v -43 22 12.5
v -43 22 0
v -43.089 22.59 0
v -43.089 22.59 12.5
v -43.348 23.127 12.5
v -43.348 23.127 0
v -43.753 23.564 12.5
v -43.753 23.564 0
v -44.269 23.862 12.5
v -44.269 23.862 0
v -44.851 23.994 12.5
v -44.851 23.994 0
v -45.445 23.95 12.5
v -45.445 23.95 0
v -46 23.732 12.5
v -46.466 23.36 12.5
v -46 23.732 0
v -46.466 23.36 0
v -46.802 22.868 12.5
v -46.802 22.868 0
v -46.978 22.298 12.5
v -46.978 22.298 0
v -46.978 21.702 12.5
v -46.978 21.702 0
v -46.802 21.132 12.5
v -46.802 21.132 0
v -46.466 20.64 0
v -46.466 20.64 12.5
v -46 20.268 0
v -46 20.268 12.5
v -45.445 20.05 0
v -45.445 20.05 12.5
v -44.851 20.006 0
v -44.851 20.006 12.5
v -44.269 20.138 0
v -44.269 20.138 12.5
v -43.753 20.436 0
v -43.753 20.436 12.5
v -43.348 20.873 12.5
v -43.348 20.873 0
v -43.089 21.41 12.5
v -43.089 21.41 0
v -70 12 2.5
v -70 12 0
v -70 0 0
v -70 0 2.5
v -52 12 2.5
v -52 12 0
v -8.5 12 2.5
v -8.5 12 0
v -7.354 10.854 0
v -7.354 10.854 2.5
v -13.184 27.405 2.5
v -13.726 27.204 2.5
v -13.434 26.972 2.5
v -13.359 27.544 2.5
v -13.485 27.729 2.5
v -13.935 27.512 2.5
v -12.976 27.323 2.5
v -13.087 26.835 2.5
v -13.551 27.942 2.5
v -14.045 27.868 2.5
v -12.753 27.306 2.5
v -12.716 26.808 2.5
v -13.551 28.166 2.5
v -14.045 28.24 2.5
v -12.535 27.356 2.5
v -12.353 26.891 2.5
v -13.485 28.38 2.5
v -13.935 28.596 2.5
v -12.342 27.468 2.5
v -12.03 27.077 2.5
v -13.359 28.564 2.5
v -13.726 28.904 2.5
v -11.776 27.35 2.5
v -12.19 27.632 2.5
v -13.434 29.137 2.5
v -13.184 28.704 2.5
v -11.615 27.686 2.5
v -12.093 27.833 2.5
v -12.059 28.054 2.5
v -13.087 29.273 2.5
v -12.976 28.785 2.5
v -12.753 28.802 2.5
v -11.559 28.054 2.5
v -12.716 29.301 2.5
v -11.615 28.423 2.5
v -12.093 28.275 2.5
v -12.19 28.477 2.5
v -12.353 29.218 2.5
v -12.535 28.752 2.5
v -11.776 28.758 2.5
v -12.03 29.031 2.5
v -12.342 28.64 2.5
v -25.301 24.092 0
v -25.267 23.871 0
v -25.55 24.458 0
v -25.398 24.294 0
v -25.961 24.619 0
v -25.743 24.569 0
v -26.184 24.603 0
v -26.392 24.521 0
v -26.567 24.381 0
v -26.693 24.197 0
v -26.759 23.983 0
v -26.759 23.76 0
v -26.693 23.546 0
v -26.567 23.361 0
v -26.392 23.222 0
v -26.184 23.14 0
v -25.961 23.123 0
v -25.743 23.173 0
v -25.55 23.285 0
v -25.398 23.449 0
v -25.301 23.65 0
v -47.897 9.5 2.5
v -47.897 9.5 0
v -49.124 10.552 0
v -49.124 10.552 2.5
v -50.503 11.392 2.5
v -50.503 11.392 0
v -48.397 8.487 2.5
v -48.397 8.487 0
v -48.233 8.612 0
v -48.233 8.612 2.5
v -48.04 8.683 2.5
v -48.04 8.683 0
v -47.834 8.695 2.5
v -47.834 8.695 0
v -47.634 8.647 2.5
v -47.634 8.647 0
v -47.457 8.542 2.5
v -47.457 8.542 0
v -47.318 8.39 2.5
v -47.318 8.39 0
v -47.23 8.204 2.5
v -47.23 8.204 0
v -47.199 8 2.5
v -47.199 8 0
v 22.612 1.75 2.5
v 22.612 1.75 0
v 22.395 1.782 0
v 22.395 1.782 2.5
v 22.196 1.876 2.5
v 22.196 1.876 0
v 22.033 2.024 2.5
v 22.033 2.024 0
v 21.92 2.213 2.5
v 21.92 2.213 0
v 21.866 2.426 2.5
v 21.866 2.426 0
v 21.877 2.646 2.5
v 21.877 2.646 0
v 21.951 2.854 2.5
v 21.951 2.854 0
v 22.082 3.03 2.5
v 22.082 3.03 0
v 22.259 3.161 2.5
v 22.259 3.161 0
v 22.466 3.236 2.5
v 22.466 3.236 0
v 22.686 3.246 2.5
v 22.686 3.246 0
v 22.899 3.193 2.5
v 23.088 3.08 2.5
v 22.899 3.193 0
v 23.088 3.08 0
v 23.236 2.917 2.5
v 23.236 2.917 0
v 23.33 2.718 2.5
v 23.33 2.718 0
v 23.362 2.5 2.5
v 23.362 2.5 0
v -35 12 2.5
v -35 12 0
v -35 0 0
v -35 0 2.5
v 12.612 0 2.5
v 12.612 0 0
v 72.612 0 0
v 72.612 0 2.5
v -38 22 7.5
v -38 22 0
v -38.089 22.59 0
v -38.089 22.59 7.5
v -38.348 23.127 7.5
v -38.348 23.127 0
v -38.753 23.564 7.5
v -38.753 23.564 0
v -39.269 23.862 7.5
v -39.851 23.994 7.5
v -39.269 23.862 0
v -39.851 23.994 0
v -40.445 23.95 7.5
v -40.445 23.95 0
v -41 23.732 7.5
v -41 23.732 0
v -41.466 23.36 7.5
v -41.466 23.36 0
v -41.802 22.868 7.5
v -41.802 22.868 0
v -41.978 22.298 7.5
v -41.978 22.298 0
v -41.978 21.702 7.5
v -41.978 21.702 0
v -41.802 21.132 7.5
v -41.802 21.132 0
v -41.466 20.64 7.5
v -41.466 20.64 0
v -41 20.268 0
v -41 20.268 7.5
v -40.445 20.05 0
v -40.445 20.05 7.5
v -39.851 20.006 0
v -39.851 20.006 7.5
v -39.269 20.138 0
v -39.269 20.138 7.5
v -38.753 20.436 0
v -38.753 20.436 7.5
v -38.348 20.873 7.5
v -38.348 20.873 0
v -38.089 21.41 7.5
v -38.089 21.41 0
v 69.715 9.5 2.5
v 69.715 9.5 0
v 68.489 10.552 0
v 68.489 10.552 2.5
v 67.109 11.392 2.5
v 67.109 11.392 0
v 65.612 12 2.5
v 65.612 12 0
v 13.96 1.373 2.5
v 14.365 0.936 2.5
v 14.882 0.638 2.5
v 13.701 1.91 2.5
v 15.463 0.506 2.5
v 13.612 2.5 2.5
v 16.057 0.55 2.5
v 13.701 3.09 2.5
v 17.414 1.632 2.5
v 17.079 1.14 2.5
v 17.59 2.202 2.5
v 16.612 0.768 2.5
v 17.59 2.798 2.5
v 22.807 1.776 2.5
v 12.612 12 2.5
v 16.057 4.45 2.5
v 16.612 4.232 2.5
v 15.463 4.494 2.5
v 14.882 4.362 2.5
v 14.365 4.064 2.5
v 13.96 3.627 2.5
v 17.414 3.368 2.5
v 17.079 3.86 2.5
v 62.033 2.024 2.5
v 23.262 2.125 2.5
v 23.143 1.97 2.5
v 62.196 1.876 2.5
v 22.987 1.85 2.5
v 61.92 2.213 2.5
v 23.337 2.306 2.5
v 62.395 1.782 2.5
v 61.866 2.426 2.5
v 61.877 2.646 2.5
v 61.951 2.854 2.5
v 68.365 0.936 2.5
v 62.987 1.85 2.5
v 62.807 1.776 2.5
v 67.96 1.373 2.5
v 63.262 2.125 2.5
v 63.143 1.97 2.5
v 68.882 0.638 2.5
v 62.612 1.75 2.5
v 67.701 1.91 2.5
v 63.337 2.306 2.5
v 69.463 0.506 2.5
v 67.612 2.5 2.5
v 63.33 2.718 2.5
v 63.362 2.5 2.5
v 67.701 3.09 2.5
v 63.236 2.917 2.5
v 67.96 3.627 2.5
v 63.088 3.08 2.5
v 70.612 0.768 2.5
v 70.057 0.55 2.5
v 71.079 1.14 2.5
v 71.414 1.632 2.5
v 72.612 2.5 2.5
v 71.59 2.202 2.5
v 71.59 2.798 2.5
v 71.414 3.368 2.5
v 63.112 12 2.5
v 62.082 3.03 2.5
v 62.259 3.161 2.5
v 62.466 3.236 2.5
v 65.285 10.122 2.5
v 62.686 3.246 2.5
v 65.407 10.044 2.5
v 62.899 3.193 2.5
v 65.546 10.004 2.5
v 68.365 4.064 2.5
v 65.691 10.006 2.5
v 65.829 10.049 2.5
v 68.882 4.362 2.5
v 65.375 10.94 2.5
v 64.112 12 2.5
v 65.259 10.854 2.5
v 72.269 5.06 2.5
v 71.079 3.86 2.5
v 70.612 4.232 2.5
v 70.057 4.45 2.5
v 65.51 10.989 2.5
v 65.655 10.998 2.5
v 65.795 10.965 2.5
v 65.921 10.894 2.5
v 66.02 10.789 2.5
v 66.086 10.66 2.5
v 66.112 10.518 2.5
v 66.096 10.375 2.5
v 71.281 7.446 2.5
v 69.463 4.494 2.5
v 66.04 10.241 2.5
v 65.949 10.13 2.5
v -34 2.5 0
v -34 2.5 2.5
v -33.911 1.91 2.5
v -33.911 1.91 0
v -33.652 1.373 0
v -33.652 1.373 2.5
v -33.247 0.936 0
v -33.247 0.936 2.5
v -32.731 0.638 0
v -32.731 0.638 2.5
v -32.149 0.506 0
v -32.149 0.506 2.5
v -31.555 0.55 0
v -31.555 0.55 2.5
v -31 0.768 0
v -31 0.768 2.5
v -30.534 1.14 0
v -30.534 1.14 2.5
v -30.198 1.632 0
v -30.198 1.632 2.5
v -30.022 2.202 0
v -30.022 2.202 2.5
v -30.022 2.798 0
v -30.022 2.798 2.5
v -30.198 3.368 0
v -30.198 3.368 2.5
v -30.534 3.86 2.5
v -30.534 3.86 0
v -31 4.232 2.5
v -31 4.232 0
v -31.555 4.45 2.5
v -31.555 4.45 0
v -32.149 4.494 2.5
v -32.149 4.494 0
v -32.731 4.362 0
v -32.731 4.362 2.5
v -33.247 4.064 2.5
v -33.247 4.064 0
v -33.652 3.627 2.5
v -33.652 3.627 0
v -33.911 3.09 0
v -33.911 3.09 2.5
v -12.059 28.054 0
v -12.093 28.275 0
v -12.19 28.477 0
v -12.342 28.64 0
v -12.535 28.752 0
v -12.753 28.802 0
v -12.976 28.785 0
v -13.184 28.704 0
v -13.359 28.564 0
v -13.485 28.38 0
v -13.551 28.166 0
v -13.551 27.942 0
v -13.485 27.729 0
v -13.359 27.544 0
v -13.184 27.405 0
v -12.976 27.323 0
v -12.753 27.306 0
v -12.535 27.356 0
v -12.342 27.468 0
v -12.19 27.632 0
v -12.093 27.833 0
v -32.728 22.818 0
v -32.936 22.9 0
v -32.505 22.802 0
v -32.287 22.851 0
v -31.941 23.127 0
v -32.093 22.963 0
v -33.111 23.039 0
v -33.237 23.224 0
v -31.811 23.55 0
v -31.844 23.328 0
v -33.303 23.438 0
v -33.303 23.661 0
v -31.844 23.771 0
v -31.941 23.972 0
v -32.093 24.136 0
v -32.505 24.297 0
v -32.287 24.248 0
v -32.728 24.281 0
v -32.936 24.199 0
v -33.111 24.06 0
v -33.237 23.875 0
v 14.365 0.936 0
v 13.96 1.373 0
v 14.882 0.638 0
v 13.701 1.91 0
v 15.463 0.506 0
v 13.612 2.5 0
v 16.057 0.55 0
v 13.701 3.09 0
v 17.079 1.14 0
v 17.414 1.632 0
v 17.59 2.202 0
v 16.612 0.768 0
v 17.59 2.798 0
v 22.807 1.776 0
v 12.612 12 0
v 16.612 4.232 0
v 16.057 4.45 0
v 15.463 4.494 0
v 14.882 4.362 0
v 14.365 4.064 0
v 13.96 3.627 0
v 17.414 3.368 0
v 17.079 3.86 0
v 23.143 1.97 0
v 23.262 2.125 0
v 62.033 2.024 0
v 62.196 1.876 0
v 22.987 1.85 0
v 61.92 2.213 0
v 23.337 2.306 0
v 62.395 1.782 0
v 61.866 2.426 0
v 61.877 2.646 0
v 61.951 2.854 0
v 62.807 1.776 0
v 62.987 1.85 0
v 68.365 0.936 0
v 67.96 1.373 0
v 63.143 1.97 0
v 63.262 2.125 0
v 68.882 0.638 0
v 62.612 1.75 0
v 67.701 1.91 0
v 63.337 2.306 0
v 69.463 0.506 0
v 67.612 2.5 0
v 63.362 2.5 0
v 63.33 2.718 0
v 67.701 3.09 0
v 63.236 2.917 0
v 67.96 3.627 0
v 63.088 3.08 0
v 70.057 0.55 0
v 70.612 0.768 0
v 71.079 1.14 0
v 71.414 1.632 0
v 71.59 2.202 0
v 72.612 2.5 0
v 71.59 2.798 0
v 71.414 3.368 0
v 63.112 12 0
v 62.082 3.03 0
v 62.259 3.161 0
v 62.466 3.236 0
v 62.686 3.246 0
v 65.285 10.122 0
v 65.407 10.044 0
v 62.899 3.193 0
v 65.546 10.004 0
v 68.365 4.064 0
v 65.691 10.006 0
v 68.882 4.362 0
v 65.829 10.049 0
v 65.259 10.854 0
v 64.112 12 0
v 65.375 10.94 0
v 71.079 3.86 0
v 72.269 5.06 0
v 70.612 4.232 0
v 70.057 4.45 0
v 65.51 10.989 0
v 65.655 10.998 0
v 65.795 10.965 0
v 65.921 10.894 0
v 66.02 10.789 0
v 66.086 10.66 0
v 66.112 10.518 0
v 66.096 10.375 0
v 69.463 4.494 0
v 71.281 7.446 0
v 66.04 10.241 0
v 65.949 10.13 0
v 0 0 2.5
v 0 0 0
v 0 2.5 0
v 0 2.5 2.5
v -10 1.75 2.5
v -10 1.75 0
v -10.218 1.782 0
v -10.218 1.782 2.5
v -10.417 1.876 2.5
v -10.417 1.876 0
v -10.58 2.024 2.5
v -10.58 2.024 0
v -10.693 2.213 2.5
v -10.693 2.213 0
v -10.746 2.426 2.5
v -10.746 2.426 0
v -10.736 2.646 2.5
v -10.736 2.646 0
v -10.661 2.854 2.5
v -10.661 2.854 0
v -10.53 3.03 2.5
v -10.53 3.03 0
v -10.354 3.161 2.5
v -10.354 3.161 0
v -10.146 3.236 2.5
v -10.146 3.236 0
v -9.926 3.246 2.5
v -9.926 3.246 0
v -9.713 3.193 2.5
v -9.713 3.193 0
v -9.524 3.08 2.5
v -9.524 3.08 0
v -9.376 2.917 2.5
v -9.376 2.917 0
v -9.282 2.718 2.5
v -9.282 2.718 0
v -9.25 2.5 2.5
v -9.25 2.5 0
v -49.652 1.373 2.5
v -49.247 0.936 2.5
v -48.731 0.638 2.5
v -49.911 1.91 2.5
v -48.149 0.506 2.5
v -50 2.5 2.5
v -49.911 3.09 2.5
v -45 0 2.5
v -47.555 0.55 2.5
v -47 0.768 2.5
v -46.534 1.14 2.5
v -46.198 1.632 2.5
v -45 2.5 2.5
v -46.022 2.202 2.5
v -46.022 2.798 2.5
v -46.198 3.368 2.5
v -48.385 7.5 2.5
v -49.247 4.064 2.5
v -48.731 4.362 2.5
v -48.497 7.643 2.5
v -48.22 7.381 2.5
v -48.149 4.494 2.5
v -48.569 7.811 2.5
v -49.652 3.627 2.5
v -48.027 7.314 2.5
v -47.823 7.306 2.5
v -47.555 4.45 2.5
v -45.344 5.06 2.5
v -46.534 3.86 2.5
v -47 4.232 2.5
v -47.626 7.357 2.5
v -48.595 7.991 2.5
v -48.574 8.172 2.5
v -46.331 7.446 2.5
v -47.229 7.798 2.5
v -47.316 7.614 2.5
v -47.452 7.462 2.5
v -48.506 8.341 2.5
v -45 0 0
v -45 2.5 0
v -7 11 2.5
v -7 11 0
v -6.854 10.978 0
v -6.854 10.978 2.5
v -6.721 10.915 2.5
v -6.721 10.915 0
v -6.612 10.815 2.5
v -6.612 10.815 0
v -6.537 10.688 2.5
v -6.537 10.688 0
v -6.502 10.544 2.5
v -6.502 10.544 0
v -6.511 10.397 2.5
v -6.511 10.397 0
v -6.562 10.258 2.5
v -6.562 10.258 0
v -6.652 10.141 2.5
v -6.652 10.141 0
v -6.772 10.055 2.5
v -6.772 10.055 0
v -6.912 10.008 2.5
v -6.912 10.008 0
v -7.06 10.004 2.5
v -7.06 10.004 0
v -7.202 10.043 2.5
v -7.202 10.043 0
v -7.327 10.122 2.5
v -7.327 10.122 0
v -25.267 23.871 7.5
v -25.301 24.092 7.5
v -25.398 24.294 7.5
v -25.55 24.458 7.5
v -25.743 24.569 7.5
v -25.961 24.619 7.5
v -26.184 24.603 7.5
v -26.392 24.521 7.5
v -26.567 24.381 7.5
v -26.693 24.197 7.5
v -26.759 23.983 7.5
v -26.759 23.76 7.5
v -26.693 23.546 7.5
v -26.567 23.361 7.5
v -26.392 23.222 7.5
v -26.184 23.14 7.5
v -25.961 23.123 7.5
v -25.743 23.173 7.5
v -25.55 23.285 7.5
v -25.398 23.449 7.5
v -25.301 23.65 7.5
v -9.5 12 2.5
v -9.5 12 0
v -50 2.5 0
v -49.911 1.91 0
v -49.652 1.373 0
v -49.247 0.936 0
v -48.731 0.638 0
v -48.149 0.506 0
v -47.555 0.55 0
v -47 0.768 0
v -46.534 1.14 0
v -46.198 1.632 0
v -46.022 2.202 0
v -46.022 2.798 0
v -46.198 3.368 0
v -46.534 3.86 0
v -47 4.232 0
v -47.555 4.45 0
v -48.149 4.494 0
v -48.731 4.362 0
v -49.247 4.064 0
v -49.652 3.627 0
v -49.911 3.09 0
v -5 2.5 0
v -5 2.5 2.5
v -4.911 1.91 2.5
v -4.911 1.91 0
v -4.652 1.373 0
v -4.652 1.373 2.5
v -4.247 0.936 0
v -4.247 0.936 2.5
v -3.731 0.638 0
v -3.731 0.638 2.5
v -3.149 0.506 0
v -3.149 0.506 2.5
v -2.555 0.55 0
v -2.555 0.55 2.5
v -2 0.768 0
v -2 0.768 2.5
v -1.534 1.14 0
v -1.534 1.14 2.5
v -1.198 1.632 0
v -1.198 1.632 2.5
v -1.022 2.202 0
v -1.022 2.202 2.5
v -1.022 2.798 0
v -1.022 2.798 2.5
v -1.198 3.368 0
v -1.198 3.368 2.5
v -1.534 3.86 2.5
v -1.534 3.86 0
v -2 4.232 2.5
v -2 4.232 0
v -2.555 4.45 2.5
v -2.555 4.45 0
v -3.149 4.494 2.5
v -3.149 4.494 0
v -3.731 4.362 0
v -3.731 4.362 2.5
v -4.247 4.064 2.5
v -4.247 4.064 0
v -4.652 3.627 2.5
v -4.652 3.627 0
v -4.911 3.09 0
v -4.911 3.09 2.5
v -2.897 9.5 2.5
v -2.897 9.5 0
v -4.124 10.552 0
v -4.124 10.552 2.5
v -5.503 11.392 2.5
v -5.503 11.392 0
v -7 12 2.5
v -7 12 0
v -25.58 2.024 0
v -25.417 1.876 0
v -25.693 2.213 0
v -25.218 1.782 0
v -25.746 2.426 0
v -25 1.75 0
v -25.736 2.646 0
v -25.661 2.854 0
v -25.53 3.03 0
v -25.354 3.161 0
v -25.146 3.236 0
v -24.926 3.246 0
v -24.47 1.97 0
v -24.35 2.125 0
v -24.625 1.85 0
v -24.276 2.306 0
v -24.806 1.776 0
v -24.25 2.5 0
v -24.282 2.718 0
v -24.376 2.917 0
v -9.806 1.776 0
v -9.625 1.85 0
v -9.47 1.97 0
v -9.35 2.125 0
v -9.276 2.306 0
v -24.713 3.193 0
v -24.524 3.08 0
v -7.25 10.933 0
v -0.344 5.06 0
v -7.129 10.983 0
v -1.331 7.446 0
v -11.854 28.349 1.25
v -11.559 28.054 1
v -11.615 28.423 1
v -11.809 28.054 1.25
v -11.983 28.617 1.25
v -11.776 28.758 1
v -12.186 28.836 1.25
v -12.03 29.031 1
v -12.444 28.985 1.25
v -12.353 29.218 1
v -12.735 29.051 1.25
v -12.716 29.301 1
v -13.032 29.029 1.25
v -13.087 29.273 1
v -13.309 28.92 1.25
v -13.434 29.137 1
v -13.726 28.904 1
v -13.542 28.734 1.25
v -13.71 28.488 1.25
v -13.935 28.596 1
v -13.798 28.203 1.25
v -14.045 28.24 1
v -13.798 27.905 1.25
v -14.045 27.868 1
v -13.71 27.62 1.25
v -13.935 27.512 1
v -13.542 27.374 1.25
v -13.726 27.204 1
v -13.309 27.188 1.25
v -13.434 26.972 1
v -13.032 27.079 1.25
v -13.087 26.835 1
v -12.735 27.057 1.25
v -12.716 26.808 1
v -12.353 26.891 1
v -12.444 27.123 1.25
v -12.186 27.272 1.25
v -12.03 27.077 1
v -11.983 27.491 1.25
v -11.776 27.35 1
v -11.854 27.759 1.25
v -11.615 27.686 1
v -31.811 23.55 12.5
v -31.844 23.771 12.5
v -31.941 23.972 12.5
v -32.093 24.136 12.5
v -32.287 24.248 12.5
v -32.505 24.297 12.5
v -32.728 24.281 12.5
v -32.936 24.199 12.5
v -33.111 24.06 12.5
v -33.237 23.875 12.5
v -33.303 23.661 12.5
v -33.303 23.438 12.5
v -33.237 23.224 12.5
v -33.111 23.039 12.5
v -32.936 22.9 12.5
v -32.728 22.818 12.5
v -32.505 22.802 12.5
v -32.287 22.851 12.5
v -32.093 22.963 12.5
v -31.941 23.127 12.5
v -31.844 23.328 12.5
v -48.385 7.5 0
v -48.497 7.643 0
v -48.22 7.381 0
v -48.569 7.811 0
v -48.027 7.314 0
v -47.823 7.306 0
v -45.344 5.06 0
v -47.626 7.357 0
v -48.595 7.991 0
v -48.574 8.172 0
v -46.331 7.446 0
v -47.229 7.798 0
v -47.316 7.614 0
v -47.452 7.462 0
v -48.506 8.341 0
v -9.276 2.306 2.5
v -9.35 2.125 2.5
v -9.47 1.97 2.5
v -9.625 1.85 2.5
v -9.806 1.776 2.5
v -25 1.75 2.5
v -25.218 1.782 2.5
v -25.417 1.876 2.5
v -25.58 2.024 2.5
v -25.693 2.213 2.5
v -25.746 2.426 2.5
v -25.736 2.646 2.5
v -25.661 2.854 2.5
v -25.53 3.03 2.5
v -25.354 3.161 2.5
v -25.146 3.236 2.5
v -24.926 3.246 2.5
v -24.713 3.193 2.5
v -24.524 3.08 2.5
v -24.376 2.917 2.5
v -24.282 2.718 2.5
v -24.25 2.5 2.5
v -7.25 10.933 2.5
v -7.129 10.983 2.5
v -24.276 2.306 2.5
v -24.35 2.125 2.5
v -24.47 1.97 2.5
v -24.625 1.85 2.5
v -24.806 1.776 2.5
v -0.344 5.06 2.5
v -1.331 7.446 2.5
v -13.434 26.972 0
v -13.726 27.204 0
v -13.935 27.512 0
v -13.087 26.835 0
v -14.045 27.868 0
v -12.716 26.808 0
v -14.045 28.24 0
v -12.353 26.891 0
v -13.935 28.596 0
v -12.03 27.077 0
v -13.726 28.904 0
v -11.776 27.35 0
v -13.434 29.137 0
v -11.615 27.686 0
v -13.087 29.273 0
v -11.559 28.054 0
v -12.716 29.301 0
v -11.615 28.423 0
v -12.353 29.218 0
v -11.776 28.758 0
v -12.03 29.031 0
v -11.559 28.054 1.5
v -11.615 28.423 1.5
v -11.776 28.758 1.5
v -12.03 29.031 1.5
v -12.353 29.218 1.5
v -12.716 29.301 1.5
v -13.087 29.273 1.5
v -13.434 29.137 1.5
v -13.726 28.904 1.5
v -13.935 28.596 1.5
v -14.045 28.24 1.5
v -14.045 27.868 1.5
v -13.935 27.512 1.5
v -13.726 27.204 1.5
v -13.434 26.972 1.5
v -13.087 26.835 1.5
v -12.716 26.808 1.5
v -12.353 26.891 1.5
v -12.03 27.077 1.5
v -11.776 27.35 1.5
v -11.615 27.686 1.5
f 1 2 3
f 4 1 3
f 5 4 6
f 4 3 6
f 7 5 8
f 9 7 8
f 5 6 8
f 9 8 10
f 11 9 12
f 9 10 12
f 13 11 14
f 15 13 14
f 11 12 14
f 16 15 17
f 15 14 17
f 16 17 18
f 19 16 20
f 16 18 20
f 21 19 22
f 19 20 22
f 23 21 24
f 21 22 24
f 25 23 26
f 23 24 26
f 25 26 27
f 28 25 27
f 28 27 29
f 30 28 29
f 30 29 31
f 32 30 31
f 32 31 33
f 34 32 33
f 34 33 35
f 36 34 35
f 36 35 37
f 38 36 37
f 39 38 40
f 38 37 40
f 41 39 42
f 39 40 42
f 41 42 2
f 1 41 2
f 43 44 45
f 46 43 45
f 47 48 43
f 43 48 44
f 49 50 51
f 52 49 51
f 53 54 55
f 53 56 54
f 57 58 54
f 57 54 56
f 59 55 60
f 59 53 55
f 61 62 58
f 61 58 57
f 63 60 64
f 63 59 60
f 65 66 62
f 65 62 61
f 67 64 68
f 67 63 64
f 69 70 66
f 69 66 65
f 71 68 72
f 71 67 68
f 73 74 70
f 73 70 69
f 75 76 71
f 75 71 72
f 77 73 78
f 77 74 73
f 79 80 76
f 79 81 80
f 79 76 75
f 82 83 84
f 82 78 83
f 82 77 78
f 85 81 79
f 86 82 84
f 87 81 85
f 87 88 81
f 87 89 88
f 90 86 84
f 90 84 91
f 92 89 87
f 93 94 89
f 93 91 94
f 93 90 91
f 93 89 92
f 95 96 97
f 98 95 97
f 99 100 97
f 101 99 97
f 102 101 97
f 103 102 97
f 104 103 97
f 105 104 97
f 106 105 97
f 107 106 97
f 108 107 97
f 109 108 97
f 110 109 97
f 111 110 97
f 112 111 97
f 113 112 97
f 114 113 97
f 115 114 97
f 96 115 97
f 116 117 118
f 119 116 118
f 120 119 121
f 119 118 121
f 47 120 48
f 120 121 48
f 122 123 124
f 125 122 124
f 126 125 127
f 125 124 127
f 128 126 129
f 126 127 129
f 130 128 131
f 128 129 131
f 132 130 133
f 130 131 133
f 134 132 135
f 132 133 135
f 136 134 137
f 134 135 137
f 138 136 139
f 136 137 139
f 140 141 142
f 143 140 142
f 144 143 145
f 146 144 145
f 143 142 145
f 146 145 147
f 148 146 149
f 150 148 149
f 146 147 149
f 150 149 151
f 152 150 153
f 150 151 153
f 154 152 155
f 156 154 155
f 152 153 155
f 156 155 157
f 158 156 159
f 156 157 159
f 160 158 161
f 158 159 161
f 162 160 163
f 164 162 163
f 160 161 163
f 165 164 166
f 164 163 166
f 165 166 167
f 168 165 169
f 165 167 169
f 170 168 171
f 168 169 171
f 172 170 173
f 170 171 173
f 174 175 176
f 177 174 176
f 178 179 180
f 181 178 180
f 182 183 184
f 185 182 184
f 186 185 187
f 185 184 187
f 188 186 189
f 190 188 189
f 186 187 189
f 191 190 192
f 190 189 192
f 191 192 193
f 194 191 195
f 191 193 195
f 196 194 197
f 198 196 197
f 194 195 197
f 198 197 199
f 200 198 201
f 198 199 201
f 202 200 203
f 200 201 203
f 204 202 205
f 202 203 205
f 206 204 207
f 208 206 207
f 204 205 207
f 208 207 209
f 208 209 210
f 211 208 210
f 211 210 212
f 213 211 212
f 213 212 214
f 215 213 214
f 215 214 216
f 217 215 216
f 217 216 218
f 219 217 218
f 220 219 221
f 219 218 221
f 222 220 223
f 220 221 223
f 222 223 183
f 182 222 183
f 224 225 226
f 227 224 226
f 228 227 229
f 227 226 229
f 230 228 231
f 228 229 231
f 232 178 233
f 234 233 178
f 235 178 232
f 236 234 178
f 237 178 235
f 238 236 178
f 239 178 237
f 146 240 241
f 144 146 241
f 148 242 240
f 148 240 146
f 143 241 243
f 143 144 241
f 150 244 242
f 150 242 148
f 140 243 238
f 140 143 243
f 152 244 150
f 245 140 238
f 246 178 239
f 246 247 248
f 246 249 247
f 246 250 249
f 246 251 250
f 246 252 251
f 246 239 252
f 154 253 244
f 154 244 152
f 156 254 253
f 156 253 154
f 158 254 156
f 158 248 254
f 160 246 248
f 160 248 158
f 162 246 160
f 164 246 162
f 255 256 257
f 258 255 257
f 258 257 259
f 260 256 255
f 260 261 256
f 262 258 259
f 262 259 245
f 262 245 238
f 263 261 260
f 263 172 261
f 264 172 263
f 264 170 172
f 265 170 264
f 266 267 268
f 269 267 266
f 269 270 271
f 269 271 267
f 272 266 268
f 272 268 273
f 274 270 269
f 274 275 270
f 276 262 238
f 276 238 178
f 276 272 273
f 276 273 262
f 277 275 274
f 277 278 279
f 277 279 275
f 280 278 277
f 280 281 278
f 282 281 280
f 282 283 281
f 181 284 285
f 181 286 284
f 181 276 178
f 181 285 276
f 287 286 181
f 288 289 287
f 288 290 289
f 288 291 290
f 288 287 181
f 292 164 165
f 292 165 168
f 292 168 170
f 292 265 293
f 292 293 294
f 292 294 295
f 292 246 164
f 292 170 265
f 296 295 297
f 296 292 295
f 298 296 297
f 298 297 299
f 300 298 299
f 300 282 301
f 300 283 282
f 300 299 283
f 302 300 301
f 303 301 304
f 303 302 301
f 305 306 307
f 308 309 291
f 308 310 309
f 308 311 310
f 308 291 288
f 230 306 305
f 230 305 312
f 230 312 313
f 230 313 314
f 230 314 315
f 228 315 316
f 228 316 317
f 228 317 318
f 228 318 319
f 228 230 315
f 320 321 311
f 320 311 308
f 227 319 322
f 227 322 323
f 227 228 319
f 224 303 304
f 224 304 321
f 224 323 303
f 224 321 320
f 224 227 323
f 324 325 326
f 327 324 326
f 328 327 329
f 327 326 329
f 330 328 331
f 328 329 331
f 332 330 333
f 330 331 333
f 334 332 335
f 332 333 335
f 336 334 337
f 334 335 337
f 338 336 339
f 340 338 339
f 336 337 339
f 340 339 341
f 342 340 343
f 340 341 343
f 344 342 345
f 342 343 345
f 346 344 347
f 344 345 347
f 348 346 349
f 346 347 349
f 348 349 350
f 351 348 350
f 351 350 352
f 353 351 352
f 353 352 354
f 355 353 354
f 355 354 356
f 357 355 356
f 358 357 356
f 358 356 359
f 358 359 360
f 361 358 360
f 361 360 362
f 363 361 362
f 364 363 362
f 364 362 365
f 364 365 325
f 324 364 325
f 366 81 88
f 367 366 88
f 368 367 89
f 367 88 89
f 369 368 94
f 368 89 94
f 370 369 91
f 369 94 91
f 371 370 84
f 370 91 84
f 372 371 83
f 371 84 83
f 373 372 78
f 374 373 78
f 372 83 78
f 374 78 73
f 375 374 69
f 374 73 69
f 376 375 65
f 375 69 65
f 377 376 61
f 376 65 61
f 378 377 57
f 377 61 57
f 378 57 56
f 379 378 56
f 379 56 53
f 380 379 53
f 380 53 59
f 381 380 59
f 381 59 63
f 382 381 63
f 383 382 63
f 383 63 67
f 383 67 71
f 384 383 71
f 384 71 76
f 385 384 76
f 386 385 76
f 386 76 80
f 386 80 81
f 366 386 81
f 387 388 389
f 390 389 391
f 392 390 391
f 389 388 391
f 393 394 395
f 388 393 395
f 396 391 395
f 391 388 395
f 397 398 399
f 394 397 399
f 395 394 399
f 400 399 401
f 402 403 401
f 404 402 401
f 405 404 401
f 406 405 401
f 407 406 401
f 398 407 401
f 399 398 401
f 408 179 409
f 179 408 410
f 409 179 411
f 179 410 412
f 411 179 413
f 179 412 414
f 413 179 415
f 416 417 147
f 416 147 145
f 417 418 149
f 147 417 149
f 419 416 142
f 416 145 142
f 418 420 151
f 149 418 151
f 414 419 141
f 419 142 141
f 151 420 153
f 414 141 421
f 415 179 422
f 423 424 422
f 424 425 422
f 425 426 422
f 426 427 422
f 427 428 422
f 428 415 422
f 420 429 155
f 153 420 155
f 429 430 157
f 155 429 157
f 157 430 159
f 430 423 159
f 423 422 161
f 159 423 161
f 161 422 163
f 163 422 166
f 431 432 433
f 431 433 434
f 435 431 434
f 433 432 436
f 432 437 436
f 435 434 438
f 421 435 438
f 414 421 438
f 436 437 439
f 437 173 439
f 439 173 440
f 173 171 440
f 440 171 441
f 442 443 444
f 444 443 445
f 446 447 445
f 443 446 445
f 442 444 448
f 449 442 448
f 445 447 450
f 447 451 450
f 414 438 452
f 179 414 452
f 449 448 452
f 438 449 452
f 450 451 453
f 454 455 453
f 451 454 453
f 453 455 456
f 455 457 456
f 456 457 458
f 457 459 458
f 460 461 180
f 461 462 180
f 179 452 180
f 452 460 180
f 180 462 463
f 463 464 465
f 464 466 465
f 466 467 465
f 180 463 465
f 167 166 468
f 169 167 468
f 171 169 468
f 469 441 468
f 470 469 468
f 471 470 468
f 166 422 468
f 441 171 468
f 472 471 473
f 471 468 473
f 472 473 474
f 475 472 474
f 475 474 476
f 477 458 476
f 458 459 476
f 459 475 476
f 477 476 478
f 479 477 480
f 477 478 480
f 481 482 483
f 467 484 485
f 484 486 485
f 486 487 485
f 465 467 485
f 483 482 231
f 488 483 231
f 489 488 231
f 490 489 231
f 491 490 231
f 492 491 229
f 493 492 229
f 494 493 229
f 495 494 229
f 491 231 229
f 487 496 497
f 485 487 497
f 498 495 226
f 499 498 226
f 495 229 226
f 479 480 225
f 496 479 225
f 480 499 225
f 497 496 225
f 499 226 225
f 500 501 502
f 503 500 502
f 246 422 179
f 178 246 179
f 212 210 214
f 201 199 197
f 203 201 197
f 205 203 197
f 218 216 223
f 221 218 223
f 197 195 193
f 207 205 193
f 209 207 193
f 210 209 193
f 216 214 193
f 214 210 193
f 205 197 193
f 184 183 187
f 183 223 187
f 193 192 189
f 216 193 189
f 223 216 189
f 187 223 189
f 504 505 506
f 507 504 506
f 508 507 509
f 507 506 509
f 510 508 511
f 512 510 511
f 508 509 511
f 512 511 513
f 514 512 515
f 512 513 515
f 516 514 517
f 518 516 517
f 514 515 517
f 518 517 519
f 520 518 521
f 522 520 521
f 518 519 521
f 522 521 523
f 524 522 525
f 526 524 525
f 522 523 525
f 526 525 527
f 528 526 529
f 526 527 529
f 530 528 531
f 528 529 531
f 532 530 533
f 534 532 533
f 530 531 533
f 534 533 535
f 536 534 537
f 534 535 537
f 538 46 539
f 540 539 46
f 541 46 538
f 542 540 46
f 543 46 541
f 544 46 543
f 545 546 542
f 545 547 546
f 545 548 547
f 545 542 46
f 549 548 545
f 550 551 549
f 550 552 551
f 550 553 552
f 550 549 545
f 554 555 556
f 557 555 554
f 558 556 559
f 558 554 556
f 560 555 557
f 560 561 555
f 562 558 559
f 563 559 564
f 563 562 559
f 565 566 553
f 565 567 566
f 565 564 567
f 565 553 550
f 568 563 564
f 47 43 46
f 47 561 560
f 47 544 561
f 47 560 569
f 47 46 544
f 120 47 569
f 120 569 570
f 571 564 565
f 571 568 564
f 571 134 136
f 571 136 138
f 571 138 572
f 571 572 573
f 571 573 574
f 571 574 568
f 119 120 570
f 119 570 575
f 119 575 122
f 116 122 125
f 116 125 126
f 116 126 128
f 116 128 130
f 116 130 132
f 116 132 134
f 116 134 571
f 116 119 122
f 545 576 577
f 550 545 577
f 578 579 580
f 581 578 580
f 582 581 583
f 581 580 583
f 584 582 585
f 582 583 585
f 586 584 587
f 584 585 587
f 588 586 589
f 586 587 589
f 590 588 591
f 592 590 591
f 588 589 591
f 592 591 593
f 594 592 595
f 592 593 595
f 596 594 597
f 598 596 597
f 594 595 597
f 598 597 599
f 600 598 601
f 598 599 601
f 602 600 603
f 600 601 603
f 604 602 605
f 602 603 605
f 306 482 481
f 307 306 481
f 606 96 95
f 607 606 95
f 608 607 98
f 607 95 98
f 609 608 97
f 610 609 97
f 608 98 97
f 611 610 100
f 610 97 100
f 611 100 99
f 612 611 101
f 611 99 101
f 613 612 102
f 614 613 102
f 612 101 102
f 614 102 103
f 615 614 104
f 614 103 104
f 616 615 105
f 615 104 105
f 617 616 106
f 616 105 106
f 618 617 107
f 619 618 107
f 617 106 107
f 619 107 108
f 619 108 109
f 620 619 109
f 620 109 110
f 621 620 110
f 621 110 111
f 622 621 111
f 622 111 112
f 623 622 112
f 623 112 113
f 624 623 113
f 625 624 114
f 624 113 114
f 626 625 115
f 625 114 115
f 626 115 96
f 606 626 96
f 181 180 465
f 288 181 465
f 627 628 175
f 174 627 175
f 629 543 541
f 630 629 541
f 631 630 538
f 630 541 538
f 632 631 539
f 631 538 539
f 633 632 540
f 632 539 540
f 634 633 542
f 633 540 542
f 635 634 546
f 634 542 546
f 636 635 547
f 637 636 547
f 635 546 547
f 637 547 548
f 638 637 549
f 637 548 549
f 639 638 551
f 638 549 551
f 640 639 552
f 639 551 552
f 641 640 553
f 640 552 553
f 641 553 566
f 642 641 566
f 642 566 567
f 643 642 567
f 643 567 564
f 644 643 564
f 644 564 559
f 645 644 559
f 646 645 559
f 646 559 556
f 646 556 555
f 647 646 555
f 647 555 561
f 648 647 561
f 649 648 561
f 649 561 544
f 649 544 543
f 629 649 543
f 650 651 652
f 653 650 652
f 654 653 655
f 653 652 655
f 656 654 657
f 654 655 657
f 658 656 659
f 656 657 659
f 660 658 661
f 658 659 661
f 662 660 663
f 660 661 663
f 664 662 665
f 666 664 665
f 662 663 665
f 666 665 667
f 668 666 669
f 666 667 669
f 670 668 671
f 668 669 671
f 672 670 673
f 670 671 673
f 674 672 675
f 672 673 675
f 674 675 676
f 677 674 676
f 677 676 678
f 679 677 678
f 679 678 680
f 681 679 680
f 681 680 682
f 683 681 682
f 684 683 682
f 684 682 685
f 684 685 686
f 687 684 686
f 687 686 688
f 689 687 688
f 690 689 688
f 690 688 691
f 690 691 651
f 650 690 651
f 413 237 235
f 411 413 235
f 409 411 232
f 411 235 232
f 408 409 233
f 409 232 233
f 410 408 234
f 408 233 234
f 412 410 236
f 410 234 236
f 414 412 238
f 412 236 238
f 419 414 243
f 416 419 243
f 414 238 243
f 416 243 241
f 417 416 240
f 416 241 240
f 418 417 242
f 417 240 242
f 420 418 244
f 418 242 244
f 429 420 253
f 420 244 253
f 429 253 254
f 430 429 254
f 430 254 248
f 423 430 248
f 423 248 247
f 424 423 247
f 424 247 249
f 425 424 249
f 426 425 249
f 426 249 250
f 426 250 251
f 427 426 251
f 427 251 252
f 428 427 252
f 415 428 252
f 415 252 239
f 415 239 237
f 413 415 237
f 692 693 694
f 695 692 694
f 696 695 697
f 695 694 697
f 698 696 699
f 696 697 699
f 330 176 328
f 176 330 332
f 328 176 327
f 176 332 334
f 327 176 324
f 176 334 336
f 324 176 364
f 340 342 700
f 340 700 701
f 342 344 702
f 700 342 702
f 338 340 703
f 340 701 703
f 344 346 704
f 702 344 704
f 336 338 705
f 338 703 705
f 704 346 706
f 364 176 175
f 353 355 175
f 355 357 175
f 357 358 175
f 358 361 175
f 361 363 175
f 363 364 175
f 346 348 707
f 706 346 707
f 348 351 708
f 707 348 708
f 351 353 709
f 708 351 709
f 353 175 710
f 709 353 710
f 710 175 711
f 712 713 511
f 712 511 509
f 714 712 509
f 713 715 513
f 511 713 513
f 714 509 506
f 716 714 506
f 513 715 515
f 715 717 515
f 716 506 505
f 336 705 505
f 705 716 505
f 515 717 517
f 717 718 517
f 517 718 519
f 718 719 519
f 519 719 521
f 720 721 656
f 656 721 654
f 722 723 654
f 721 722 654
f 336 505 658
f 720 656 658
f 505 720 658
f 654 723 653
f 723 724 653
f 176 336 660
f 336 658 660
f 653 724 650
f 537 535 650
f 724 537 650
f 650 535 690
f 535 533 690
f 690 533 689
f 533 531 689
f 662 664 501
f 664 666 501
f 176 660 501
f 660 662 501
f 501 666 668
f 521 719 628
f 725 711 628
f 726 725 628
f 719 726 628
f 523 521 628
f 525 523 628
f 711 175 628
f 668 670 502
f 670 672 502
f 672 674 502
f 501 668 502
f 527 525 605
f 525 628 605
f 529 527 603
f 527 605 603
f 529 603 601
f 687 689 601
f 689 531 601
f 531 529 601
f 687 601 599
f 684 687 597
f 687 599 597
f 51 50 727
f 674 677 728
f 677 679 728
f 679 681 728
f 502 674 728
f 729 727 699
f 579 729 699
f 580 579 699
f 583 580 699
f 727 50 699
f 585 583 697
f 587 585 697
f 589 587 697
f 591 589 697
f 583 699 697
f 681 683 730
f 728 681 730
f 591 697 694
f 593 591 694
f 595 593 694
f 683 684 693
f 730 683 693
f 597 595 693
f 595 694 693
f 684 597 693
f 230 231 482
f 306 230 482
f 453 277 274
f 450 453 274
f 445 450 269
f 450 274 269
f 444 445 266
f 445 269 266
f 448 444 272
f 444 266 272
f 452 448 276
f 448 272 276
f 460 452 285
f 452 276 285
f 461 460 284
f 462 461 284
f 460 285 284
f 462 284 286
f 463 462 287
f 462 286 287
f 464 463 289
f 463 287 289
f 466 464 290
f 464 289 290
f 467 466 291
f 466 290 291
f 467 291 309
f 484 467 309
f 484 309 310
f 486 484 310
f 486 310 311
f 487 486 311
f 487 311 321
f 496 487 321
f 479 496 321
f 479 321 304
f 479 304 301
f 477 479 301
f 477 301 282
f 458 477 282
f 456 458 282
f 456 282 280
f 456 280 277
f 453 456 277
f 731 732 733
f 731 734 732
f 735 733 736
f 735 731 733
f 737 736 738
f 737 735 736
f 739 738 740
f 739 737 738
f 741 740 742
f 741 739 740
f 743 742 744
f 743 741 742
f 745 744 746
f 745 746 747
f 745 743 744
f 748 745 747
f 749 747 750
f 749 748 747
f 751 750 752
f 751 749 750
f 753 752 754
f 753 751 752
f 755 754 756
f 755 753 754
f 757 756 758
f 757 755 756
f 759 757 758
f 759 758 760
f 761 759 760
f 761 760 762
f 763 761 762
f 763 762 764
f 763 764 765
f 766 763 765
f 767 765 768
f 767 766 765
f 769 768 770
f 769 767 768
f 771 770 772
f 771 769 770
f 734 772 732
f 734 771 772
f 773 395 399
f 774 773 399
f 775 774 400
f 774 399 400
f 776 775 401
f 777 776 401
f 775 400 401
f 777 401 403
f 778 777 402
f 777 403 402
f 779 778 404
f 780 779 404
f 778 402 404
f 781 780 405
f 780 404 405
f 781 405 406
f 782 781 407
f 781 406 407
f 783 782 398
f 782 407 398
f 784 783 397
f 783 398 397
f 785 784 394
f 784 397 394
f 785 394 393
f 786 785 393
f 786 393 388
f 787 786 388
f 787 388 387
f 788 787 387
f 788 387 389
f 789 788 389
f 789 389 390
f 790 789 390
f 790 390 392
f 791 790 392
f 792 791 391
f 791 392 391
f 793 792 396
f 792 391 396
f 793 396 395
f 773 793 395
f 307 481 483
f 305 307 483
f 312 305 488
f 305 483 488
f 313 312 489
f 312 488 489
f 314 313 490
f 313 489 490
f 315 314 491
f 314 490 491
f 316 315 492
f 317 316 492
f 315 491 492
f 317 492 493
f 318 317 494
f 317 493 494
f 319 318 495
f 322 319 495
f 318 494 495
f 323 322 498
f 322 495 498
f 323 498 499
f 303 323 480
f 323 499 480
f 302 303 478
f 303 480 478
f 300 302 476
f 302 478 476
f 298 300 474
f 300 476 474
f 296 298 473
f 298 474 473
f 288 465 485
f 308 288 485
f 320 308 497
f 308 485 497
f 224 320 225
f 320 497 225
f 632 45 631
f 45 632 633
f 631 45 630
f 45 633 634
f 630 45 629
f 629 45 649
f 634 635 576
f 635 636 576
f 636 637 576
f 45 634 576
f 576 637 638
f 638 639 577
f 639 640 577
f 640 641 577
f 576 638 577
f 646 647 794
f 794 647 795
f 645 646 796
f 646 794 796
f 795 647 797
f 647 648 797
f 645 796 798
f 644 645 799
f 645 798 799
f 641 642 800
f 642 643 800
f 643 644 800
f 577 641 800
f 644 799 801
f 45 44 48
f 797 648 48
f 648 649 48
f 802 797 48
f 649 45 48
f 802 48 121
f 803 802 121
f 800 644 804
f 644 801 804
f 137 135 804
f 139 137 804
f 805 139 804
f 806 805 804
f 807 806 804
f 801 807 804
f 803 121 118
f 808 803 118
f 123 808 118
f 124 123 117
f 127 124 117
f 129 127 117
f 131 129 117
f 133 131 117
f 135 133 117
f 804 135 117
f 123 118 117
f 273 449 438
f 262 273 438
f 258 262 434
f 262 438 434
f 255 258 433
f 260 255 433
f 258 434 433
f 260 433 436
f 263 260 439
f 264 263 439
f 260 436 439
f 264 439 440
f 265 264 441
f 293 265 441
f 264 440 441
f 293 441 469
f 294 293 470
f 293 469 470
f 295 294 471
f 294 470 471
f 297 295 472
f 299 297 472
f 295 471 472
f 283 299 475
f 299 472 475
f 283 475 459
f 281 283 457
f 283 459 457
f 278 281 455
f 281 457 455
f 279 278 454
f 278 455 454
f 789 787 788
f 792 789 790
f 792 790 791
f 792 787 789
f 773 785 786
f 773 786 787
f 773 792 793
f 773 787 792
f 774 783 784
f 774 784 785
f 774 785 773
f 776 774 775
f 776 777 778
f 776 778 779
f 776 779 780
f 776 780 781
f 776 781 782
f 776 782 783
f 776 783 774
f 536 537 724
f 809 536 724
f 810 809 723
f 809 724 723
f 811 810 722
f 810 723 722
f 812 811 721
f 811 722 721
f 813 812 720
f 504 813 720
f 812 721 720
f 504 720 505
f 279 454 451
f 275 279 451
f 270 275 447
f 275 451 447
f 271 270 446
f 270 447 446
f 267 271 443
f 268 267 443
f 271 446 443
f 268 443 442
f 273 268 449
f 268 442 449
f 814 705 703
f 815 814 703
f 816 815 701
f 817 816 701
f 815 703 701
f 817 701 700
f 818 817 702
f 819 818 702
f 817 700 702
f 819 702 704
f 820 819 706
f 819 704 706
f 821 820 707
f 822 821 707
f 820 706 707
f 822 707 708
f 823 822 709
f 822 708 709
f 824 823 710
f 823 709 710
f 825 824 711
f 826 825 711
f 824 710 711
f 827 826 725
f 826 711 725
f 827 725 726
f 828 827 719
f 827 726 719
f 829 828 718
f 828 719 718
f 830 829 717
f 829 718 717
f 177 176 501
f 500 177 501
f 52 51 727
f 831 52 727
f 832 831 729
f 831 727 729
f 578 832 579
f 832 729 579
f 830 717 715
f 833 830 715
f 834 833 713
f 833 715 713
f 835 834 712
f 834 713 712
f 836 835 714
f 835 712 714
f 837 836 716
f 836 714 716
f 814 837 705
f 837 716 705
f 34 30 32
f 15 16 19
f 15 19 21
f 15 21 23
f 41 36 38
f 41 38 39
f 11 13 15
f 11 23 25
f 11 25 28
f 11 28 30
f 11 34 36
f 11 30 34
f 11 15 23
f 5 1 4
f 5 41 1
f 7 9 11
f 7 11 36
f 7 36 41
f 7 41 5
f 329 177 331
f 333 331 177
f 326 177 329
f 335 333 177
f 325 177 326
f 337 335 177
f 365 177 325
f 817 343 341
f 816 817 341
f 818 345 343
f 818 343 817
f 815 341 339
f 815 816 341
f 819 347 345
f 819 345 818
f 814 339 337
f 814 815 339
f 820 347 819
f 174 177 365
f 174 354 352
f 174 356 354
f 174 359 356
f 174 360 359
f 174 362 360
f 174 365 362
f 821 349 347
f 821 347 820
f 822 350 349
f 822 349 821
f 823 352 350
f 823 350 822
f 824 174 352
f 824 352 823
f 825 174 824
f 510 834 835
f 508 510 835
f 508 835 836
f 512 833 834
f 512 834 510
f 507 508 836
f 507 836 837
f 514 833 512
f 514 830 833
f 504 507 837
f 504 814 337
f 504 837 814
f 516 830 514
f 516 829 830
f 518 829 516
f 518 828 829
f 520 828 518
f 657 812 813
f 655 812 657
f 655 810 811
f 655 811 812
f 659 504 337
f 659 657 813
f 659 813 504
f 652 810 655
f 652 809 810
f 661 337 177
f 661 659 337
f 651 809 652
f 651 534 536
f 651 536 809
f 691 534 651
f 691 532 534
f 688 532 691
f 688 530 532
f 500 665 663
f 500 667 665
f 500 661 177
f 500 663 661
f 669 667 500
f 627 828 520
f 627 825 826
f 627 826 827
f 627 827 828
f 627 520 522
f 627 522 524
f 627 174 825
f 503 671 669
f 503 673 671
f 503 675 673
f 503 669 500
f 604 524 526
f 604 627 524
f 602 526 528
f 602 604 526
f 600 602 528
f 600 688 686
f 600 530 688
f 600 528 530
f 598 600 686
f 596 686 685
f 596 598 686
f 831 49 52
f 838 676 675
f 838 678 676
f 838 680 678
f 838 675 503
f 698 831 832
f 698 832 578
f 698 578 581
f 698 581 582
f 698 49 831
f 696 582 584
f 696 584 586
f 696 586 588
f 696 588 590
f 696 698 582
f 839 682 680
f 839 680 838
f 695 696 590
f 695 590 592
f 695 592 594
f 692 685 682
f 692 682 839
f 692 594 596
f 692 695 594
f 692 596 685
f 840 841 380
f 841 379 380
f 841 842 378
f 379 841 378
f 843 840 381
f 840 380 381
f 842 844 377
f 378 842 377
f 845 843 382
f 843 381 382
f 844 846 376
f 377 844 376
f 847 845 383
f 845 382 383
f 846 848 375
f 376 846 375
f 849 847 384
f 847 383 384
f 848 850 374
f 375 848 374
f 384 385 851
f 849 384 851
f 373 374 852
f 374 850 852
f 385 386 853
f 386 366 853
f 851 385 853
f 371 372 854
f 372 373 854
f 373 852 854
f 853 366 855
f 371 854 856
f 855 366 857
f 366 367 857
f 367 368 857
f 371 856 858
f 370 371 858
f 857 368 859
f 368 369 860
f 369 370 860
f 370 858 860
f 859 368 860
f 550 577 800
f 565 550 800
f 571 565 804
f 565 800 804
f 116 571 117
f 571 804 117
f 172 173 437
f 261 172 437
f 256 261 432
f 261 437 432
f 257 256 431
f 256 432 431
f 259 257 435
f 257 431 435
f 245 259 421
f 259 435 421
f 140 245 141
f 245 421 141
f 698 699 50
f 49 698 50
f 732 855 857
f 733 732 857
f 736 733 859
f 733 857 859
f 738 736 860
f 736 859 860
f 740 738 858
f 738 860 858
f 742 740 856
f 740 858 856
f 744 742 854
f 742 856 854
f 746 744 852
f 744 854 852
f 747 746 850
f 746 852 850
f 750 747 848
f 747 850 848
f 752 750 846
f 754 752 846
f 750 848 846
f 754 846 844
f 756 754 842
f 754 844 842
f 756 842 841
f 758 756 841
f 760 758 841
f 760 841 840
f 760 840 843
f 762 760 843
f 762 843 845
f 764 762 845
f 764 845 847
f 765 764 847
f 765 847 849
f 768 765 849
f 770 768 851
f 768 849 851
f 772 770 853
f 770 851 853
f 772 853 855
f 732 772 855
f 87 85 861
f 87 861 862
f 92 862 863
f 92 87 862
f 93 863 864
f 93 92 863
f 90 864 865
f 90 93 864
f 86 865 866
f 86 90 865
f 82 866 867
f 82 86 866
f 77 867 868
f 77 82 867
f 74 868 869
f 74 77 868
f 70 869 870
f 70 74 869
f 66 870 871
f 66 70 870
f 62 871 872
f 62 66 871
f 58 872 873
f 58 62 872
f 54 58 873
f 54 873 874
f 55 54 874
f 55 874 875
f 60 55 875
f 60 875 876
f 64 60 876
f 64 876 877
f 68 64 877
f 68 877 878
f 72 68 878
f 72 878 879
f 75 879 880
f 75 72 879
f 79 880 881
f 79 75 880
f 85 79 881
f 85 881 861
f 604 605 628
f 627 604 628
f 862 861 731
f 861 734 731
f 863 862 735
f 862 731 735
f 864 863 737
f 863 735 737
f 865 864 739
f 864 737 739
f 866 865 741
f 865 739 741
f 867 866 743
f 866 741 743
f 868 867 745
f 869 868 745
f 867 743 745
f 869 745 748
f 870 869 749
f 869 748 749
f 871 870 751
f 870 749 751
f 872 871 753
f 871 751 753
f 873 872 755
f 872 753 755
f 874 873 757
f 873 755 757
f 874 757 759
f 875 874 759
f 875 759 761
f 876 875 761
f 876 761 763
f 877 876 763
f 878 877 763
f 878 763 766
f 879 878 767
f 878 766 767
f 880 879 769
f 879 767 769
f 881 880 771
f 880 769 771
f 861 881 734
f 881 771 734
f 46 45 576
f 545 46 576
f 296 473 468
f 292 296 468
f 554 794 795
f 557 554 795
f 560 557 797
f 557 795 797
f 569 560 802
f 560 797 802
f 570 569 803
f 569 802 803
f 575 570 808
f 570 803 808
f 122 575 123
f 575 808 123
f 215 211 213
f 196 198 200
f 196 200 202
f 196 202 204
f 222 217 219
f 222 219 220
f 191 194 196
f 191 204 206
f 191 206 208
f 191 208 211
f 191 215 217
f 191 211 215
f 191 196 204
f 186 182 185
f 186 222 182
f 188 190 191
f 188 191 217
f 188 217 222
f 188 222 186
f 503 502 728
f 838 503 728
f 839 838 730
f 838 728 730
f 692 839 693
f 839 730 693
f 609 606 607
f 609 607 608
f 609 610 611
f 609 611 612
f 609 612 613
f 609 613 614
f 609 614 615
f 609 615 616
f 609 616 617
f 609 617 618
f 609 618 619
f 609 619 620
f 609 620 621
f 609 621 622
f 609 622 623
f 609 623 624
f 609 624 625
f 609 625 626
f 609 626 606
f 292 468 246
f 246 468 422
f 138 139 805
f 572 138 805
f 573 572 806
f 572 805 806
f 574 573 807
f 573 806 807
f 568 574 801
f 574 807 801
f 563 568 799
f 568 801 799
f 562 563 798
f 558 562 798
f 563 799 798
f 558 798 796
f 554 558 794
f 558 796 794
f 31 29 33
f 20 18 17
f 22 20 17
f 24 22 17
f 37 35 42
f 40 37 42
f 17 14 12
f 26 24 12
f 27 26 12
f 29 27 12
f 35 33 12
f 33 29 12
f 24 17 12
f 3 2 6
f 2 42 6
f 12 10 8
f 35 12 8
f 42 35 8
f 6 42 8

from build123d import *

# Parameters (mm, degrees)
F0_R       = 2
F1_DEPTH   = 2.5
F2_D       = 4
F2_DEPTH   = 16
F2_TIP     = 1.2017212381
F2_2_D     = 4
F2_2_DEPTH = 16
F2_2_TIP   = 1.2017212381
F2_3_D     = 4
F2_3_DEPTH = 16
F2_3_TIP   = 1.2017212381
F3_DEPTH   = 12.5
F4_R       = 0.75
F5_DEPTH   = 12.5
F6_DEPTH   = 7.5
F7_DEPTH   = 7.5
F8_R       = 1.25
F8_R_2     = 0.75
F9_DEPTH   = 1.25
F10_SIZE   = 0.25


with BuildPart() as f1:
    # F0 (on Top) → F1 (new body)
    with BuildSketch(Plane.XY):
        with BuildLine():
            Line((-70, 0), (-45, 0))
            Line((-45, 0), (-45, 2.5))
            ThreePointArc((-45, 2.5), (-45.7601235959, 6.2849945688), (-47.8973441844, 9.5))
            Line((-47.8973441844, 9.5), (-49.4358401153, 9.5))
            Line((-49.4358401153, 9.5), (-48.3971836964, 8.4873326298))
            ThreePointArc((-48.3971836964, 8.4873326298), (-47.6342865886, 8.6466322998), (-47.1992520488, 8))
            ThreePointArc((-47.1992520488, 8), (-47.6261159102, 7.356752106), (-48.3846768143, 7.500160488))
            Line((-48.3846768143, 7.500160488), (-50.4358401153, 9.5))
            Line((-50.4358401153, 9.5), (-70, 9.5))
            Line((-70, 9.5), (-70, 0))
        make_face()
        with Locations((-48, 2.5)):
            Circle(F0_R, mode=Mode.SUBTRACT)
        Polygon((-70, 12), (-70, 9.5), (-50.4358401153, 9.5), (-53, 12), align=None)
        with Locations((-48, 2.5)):
            Circle(F0_R)
        with BuildLine():
            Line((-49.4358401153, 9.5), (-47.8973441844, 9.5))
            ThreePointArc((-47.8973441844, 9.5), (-49.7963054178, 11.0000432091), (-52, 12))
            Line((-52, 12), (-49.4358401153, 9.5))
        make_face()
        Polygon((-53, 12), (-50.4358401153, 9.5), (-49.4358401153, 9.5), (-52, 12), align=None)
        with BuildLine():
            Line((-49.4358401153, 9.5), (-50.4358401153, 9.5))
            Line((-50.4358401153, 9.5), (-48.3846768143, 7.500160488))
            ThreePointArc((-48.3846768143, 7.500160488), (-48.5953803001, 7.9911562988), (-48.3971836964, 8.4873326298))
            Line((-48.3971836964, 8.4873326298), (-49.4358401153, 9.5))
        make_face()
    extrude(amount=F1_DEPTH)

    # F2
    with Locations(Plane(origin=(0, 0, 0), x_dir=(1, 0, 0), z_dir=(0, 0, -1))):
        with Locations((-3, -2.5), (69.612413615, -2.5), (-48, -2.5), (-32, -2.5), (15.612413615, -2.5)):
            Hole(F2_D / 2, depth=F2_DEPTH)
            with Locations((0, 0, -(F2_DEPTH + F2_TIP / 2))):  # 118° drill point
                Cone(0, F2_D / 2, F2_TIP, mode=Mode.SUBTRACT)


with BuildPart() as f1b:
    # F0 (on Top) → F1, piece 2 (new body)
    with BuildSketch(Plane.XY):
        with BuildLine():
            Line((12.612413615, 12), (12.612413615, 9.5))
            Line((12.612413615, 9.5), (69.7150694305, 9.5))
            ThreePointArc((69.7150694305, 9.5), (67.8161081972, 11.0000432091), (65.612413615, 12))
            Line((65.612413615, 12), (64.112413615, 12))
            Line((64.112413615, 12), (65.2588602244, 10.8535533906))
            ThreePointArc((65.2588602244, 10.8535533906), (66.1120839739, 10.5181530279), (65.2854476159, 10.1217233348))
            Line((65.2854476159, 10.1217233348), (63.112413615, 12))
            Line((63.112413615, 12), (12.612413615, 12))
        make_face()
        with BuildLine():
            Line((12.612413615, 2.5), (12.612413615, 0))
            Line((12.612413615, 0), (22.612413615, 0))
            Line((22.612413615, 0), (62.612413615, 0))
            Line((62.612413615, 0), (70, 0))
            Line((70, 0), (72.612413615, 0))
            Line((72.612413615, 0), (72.612413615, 2.5))
            ThreePointArc((72.612413615, 2.5), (71.8522900191, 6.2849945688), (69.7150694305, 9.5))
            Line((69.7150694305, 9.5), (12.612413615, 9.5))
            Line((12.612413615, 9.5), (12.612413615, 2.5))
        make_face()
        with BuildLine():
            ThreePointArc((17.612413615, 2.5), (15.612413615, 0.5), (13.612413615, 2.5))
            ThreePointArc((13.612413615, 2.5), (15.612413615, 4.5), (17.612413615, 2.5))
        make_face(mode=Mode.SUBTRACT)
        with BuildLine():
            ThreePointArc((23.362413615, 2.5), (23.1427437009, 1.9696699141), (22.612413615, 1.75))
            ThreePointArc((22.612413615, 1.75), (22.0820835291, 3.0303300859), (23.362413615, 2.5))
        make_face(mode=Mode.SUBTRACT)
        with BuildLine():
            ThreePointArc((63.362413615, 2.5), (63.1427437009, 1.9696699141), (62.612413615, 1.75))
            ThreePointArc((62.612413615, 1.75), (62.0820835291, 3.0303300859), (63.362413615, 2.5))
        make_face(mode=Mode.SUBTRACT)
        with Locations((69.612413615, 2.5)):
            Circle(F0_R, mode=Mode.SUBTRACT)
        with Locations((69.612413615, 2.5)):
            Circle(F0_R)
        with BuildLine():
            ThreePointArc((17.612413615, 2.5), (15.612413615, 4.5), (13.612413615, 2.5))
            ThreePointArc((13.612413615, 2.5), (15.612413615, 0.5), (17.612413615, 2.5))
        make_face()
    extrude(amount=F1_DEPTH)

    # F2#2
    with Locations(Plane(origin=(0, 0, 0), x_dir=(1, 0, 0), z_dir=(0, 0, -1))):
        with Locations((-3, -2.5), (69.612413615, -2.5), (-48, -2.5), (-32, -2.5), (15.612413615, -2.5)):
            Hole(F2_2_D / 2, depth=F2_2_DEPTH)
            with Locations((0, 0, -(F2_2_DEPTH + F2_2_TIP / 2))):  # 118° drill point
                Cone(0, F2_2_D / 2, F2_2_TIP, mode=Mode.SUBTRACT)


with BuildPart() as f1c:
    # F0 (on Top) → F1, piece 3 (new body)
    with BuildSketch(Plane.XY):
        with BuildLine():
            Line((-35, 9.5), (-2.8973441844, 9.5))
            ThreePointArc((-2.8973441844, 9.5), (-4.7963054178, 11.0000432091), (-7, 12))
            Line((-7, 12), (-7, 11))
            ThreePointArc((-7, 11), (-6.5314179194, 10.325555643), (-7.3269659991, 10.1217233348))
            Line((-7.3269659991, 10.1217233348), (-9.5, 12))
            Line((-9.5, 12), (-35, 12))
            Line((-35, 12), (-35, 9.5))
        make_face()
        with BuildLine():
            Line((-10, 0), (0, 0))
            Line((0, 0), (0, 2.5))
            ThreePointArc((0, 2.5), (-0.7601235959, 6.2849945688), (-2.8973441844, 9.5))
            Line((-2.8973441844, 9.5), (-35, 9.5))
            Line((-35, 9.5), (-35, 2.5))
            Line((-35, 2.5), (-35, 0))
            Line((-35, 0), (-25, 0))
            Line((-25, 0), (-10, 0))
        make_face()
        with BuildLine():
            ThreePointArc((-30, 2.5), (-32, 0.5), (-34, 2.5))
            ThreePointArc((-34, 2.5), (-32, 4.5), (-30, 2.5))
        make_face(mode=Mode.SUBTRACT)
        with BuildLine():
            ThreePointArc((-24.25, 2.5), (-24.4696699141, 1.9696699141), (-25, 1.75))
            ThreePointArc((-25, 1.75), (-25.5303300859, 3.0303300859), (-24.25, 2.5))
        make_face(mode=Mode.SUBTRACT)
        with BuildLine():
            ThreePointArc((-9.25, 2.5), (-9.4696699141, 1.9696699141), (-10, 1.75))
            ThreePointArc((-10, 1.75), (-10.5303300859, 3.0303300859), (-9.25, 2.5))
        make_face(mode=Mode.SUBTRACT)
        with Locations((-3, 2.5)):
            Circle(F0_R, mode=Mode.SUBTRACT)
        with Locations((-3, 2.5)):
            Circle(F0_R)
        with BuildLine():
            ThreePointArc((-30, 2.5), (-32, 4.5), (-34, 2.5))
            ThreePointArc((-34, 2.5), (-32, 0.5), (-30, 2.5))
        make_face()
        with BuildLine():
            Line((-7, 11), (-7, 12))
            Line((-7, 12), (-8.5, 12))
            Line((-8.5, 12), (-7.3535533906, 10.8535533906))
            ThreePointArc((-7.3535533906, 10.8535533906), (-7.1913417162, 10.9619397663), (-7, 11))
        make_face()
    extrude(amount=F1_DEPTH)

    # F2#3
    with Locations(Plane(origin=(0, 0, 0), x_dir=(1, 0, 0), z_dir=(0, 0, -1))):
        with Locations((-3, -2.5), (69.612413615, -2.5), (-48, -2.5), (-32, -2.5), (15.612413615, -2.5)):
            Hole(F2_3_D / 2, depth=F2_3_DEPTH)
            with Locations((0, 0, -(F2_3_DEPTH + F2_3_TIP / 2))):  # 118° drill point
                Cone(0, F2_3_D / 2, F2_3_TIP, mode=Mode.SUBTRACT)


with BuildPart() as f3:
    # F0 (on Top) → F3 (new body)
    with BuildSketch(Plane.XY):
        with Locations((-45, 22)):
            Circle(F0_R)
    extrude(amount=F3_DEPTH)


with BuildPart() as f5:
    # F4 (on Top) → F5 (new body)
    with BuildSketch(Plane.XY):
        with Locations((-32.5610116124, 23.5495194793)):
            Circle(F4_R)
    extrude(amount=F5_DEPTH)


with BuildPart() as f6:
    # F4 (on Top) → F6 (new body)
    with BuildSketch(Plane.XY):
        with Locations((-26.0173063725, 23.8713417202)):
            Circle(F4_R)
    extrude(amount=F6_DEPTH)


with BuildPart() as f7:
    # F0 (on Top) → F7 (new body)
    with BuildSketch(Plane.XY):
        with Locations((-40, 22)):
            Circle(F0_R)
    extrude(amount=F7_DEPTH)


with BuildPart() as f9:
    # F8 (on Top) → F9 (new body)
    with BuildSketch(Plane.XY):
        with Locations((-12.8092793748, 28.0541237444)):
            Circle(F8_R)
        with Locations((-12.8092793748, 28.0541237444)):
            Circle(F8_R_2, mode=Mode.SUBTRACT)
    extrude(amount=F9_DEPTH)

    # F10
    f10_edges = [f9.edges().sort_by_distance(p)[0] for p in [
        (-14.059279, 28.054124, 1.25),
    ]]
    chamfer(f10_edges, length=F10_SIZE)

    # F11: F9 across face


with BuildPart() as f9_1:
    add(f9.part)
    add(f9.part.mirror(Plane(origin=(-12.8092793748, 28.0541237444, 1.25), x_dir=(1, 0, 0), z_dir=(0, 0, 1))))


solid = Compound([f1.part, f1b.part, f1c.part, f3.part, f5.part, f6.part, f7.part, f9_1.part])
